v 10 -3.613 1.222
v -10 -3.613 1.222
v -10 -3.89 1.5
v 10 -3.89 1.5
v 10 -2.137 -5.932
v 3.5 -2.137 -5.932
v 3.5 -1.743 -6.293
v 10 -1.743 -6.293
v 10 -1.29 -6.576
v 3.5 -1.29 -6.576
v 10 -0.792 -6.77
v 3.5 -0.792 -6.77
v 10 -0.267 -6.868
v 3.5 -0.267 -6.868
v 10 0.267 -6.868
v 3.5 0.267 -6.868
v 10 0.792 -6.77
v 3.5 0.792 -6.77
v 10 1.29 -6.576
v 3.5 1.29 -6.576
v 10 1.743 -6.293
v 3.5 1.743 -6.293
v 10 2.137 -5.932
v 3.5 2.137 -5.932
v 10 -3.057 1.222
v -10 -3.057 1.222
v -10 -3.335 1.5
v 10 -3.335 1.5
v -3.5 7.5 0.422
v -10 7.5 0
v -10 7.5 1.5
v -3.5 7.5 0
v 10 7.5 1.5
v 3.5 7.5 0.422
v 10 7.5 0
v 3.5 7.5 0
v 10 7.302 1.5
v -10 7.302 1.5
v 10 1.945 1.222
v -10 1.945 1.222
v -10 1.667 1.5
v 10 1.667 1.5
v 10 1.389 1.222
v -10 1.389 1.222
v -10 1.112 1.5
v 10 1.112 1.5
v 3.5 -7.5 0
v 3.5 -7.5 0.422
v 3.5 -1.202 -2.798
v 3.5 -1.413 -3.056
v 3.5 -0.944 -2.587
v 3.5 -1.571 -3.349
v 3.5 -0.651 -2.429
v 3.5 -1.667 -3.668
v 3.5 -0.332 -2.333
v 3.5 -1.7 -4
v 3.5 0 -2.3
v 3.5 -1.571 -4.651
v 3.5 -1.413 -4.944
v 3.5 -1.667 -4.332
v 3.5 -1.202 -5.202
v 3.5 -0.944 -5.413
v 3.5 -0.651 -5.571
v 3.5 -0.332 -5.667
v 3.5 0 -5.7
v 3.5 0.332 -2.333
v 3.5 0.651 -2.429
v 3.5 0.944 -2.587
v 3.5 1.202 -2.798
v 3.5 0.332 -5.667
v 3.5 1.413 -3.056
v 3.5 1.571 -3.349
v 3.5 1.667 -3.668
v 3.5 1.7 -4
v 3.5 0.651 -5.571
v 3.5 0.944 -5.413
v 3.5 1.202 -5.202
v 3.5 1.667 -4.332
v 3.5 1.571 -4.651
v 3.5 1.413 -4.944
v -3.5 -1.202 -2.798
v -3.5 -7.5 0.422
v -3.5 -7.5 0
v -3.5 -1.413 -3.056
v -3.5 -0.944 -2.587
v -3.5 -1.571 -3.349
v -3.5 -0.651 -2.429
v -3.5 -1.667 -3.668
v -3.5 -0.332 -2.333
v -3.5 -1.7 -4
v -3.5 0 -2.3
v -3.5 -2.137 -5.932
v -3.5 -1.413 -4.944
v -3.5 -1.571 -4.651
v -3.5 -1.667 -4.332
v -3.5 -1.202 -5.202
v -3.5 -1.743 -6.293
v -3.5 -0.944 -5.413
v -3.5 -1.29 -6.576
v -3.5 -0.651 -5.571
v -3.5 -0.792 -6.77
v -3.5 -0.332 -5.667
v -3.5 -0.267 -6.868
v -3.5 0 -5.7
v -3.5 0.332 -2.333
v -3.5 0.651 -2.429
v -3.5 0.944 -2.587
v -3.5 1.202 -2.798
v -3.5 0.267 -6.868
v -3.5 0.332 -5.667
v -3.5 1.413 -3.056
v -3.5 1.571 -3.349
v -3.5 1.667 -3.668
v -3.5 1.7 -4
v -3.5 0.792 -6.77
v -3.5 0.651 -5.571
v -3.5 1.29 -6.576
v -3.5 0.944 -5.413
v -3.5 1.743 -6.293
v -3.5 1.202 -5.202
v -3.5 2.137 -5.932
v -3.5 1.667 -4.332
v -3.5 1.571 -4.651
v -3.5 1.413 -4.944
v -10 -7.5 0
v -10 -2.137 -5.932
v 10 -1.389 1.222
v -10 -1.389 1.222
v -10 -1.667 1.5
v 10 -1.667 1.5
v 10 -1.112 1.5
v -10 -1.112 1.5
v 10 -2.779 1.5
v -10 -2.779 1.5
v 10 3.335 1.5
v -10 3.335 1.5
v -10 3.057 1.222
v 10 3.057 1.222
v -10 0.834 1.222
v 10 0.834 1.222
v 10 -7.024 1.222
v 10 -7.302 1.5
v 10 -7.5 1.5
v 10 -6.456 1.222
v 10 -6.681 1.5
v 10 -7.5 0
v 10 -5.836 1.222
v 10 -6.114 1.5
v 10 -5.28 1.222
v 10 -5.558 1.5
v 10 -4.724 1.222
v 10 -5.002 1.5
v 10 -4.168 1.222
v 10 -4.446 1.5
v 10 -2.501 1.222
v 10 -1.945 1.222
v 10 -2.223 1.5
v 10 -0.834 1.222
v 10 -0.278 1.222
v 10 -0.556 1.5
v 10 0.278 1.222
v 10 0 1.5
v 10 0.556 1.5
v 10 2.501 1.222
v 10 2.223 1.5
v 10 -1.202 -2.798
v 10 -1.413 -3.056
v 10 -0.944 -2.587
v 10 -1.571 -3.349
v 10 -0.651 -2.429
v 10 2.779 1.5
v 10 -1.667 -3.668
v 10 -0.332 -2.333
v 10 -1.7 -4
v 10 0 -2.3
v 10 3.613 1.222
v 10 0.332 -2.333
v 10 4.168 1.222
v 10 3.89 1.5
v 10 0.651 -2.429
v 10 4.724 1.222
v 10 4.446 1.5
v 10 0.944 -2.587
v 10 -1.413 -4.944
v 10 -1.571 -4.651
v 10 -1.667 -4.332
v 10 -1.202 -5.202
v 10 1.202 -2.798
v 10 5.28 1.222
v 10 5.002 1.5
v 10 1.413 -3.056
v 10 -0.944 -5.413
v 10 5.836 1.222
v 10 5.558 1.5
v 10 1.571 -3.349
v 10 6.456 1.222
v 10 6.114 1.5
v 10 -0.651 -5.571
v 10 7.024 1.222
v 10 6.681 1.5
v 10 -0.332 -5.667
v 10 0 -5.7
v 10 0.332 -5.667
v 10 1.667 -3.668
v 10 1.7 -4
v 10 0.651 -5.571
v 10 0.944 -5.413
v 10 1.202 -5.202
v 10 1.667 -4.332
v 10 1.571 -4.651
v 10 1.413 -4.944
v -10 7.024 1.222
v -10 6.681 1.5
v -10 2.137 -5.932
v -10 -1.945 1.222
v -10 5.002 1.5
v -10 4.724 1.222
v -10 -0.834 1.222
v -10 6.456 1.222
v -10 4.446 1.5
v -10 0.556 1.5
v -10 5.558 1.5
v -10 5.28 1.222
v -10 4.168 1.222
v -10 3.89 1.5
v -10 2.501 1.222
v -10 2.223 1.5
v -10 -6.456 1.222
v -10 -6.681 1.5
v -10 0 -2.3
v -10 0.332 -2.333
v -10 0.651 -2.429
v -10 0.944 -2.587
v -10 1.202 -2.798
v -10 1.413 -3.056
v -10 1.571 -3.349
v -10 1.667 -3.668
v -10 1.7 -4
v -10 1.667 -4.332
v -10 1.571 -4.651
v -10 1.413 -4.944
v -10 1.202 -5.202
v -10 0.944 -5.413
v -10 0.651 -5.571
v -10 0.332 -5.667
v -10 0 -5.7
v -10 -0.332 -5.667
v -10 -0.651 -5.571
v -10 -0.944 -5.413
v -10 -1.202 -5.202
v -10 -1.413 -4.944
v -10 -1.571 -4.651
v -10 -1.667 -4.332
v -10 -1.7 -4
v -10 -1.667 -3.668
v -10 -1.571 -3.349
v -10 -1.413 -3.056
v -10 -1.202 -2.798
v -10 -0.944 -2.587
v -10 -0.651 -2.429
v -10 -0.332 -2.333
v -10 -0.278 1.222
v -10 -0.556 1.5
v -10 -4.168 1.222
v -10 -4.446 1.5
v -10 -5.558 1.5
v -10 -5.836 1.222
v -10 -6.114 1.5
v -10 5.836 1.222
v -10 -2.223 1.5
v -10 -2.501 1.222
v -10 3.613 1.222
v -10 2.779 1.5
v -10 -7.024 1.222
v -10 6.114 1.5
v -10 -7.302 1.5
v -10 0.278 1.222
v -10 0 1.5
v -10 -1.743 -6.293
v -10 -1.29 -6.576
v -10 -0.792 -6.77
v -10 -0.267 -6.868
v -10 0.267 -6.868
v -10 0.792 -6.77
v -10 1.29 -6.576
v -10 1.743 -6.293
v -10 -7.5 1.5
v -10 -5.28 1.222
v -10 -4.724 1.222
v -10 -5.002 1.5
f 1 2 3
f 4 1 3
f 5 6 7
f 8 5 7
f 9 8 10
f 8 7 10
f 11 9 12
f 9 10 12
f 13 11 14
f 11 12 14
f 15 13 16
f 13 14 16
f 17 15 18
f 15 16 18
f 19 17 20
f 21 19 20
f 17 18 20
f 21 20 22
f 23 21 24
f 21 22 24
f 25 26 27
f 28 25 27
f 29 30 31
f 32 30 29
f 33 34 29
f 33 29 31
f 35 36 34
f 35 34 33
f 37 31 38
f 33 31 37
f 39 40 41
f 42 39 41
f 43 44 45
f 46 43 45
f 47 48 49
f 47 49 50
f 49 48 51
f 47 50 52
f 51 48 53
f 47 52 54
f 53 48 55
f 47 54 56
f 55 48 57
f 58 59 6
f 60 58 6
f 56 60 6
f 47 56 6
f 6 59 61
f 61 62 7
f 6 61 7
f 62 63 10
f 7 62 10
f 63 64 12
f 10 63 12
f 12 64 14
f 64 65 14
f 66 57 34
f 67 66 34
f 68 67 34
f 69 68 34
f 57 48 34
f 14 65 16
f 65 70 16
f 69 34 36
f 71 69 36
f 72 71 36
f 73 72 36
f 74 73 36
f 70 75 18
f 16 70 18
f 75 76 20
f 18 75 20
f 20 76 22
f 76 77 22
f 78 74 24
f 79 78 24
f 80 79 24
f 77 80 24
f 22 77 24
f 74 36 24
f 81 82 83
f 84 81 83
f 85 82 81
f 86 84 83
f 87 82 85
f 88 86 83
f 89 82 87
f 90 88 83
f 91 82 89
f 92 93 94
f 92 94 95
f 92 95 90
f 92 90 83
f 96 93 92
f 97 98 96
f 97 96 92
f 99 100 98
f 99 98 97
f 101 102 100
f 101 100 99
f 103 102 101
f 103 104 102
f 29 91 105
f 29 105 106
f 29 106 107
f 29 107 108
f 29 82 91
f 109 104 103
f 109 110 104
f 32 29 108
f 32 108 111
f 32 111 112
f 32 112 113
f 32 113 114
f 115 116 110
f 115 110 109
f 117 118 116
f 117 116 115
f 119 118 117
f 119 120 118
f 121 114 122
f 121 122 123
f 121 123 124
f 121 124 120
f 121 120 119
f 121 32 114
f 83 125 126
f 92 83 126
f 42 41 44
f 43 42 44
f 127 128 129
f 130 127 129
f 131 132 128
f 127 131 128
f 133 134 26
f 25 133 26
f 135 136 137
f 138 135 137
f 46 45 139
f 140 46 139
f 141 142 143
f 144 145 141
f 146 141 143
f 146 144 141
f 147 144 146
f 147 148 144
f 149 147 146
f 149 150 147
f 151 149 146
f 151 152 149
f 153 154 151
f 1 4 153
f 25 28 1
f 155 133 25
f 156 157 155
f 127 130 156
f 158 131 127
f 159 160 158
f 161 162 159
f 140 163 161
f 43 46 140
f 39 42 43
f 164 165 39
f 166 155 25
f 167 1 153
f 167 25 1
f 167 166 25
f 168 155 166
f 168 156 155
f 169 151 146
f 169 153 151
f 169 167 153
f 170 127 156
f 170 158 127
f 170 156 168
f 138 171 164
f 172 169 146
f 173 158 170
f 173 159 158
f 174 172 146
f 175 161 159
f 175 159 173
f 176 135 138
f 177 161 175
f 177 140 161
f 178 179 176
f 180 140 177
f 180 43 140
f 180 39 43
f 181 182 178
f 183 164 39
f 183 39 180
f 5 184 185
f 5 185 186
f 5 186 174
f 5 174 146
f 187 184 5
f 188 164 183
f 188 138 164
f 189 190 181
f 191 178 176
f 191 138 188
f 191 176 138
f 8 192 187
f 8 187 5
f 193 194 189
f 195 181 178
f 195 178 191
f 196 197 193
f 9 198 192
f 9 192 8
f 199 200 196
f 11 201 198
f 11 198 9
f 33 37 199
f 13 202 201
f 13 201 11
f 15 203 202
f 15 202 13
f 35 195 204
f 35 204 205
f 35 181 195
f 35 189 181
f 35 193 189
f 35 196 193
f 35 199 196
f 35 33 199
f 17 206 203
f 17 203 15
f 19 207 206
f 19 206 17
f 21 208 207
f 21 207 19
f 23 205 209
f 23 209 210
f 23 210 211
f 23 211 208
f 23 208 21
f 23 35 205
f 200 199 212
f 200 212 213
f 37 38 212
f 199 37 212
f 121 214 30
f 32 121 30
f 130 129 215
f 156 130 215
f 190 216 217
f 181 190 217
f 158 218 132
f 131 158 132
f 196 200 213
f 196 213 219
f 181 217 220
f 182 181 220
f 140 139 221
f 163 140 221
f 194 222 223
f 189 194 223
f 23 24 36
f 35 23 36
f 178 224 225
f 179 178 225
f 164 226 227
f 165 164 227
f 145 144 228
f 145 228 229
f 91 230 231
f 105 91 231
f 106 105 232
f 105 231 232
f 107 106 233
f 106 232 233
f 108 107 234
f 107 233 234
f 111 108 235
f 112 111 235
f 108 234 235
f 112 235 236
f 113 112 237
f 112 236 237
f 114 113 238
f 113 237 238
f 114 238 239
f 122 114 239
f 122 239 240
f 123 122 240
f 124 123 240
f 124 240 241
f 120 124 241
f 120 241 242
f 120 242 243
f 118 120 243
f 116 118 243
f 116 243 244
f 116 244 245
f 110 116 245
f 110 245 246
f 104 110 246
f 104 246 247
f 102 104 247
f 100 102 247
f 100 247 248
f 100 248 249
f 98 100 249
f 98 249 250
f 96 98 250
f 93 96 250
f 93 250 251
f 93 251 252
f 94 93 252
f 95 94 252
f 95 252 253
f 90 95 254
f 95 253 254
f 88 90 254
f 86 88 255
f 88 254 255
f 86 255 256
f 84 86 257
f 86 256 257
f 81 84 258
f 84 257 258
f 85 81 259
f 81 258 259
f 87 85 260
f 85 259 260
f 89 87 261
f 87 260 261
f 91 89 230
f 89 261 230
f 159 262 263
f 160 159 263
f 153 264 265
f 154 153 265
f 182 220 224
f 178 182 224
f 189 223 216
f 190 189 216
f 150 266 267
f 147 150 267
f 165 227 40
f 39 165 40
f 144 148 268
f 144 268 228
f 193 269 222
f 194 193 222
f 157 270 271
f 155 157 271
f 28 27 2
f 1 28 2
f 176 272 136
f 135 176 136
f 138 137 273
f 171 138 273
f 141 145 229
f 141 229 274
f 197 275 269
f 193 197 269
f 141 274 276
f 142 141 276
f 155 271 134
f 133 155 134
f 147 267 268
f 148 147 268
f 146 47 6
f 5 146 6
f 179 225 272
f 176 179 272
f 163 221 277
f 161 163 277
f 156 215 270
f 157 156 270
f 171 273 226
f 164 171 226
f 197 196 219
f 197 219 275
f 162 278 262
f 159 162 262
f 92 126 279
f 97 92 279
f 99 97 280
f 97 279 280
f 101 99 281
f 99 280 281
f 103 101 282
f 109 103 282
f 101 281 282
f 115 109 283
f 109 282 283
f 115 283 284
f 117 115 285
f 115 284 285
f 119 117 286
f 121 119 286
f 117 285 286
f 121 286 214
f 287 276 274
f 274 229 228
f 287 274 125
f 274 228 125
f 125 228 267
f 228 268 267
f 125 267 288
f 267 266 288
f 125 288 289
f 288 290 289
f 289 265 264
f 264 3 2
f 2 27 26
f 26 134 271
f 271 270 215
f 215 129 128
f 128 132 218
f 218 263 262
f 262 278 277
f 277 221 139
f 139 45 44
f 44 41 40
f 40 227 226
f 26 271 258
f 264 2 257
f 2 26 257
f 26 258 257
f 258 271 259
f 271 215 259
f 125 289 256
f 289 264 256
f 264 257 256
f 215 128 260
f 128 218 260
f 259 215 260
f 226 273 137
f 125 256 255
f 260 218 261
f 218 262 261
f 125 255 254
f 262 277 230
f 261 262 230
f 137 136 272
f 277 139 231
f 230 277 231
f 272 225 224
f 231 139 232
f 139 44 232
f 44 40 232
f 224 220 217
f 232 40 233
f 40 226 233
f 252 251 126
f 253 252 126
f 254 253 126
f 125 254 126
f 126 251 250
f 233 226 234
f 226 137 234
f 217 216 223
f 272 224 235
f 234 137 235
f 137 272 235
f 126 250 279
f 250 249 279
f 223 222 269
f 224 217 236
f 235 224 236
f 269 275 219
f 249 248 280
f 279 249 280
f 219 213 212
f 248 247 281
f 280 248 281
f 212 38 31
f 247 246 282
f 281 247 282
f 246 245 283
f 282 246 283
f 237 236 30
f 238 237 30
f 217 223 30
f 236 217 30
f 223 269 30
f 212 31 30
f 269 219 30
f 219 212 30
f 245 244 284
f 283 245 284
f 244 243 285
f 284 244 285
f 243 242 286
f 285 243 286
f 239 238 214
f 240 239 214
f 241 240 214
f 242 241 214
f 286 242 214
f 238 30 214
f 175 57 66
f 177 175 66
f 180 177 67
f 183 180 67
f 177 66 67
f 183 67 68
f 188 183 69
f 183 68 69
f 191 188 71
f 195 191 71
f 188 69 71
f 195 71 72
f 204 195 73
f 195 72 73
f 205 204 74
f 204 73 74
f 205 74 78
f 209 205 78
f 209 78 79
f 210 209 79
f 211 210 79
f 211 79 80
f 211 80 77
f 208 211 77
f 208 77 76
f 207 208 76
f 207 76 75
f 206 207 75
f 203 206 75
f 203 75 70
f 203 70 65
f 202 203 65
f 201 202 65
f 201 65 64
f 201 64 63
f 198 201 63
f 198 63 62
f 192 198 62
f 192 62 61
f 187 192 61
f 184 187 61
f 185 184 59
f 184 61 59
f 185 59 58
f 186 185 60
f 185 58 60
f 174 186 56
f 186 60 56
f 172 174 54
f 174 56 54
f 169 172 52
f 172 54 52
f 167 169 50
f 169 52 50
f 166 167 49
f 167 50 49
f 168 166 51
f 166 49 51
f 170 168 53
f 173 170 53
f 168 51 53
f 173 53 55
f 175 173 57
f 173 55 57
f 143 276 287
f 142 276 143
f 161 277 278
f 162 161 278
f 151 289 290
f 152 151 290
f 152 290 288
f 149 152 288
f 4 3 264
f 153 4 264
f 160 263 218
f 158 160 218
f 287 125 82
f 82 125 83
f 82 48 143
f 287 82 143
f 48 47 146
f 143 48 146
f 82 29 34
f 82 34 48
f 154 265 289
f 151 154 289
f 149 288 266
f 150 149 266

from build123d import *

# Parameters (mm, degrees)
ESQUISSE2_W             = 20
ESQUISSE2_H             = 15
BOSS_EXTRU_1_DEPTH      = 1.5
ESQUISSE3_R             = 1.7
BOSS_EXTRU_2_DEPTH      = 20
ENL_V_MAT_EXTRU_2_DEPTH = 3.5
ENL_V_MAT_EXTRU_4_DEPTH = 21


with BuildPart() as part:
    # Esquisse2 → Boss.-Extru.1 (new body)
    with BuildSketch(Plane.XY):
        Rectangle(ESQUISSE2_W, ESQUISSE2_H)
    extrude(amount=BOSS_EXTRU_1_DEPTH)

    # Esquisse3 → Boss.-Extru.2 (add)
    with BuildSketch(Plane.ZY.offset(10)):
        with BuildLine():
            Line((-5.931892952, 2.136705913), (0, 7.5))
            Line((0, 7.5), (0, -7.5))
            Line((0, -7.5), (-5.931892952, -2.136705913))
            ThreePointArc((-5.931892952, -2.136705913), (-6.880576771, 0), (-5.931892952, 2.136705913))
        make_face()
        with Locations((-4, 0)):
            Circle(ESQUISSE3_R, mode=Mode.SUBTRACT)
    extrude(amount=-BOSS_EXTRU_2_DEPTH)

    # Esquisse5 → Enlèv. mat.-Extru.2 (cut, symmetric)
    with BuildSketch(Plane.ZY):
        with BuildLine():
            Line((0.421634759, 7.5), (0.421634759, -7.5))
            Line((0.421634759, -7.5), (0, -7.5))
            Line((0, -7.5), (-5.931892952, -2.136705913))
            ThreePointArc((-5.931892952, -2.136705913), (-6.880576771, 0), (-5.931892952, 2.136705913))
            Line((-5.931892952, 2.136705913), (0, 7.5))
            Line((0, 7.5), (0.421634759, 7.5))
        make_face()
    extrude(amount=ENL_V_MAT_EXTRU_2_DEPTH, both=True, mode=Mode.SUBTRACT)

    # Esquisse4 → Enlèv. mat.-Extru.4 (cut)
    with BuildSketch(Plane.ZY.offset(10)):
        Polygon((1.222110979, 7.02363184), (1.5, 6.681425034), (1.5, 7.301520861), align=None)
        Polygon((1.222110979, 6.455765268), (1.5, 6.113558462), (1.5, 6.681425034), align=None)
        Polygon((1.222110979, 5.835669441), (1.5, 5.55778042), (1.5, 6.113558462), align=None)
        Polygon((1.222110979, 5.279891399), (1.5, 5.002002378), (1.5, 5.55778042), align=None)
        Polygon((1.222110979, 4.724113357), (1.5, 4.446224336), (1.5, 5.002002378), align=None)
        Polygon((1.222110979, 4.168335315), (1.5, 3.890446294), (1.5, 4.446224336), align=None)
        Polygon((1.222110979, 3.612557273), (1.5, 3.334668252), (1.5, 3.890446294), align=None)
        Polygon((1.222110979, 3.056779231), (1.5, 2.77889021), (1.5, 3.334668252), align=None)
        Polygon((1.222110979, 2.501001189), (1.5, 2.223112168), (1.5, 2.77889021), align=None)
        Polygon((1.222110979, 1.945223147), (1.5, 1.667334126), (1.5, 2.223112168), align=None)
        Polygon((1.222110979, 1.389445105), (1.5, 1.111556084), (1.5, 1.667334126), align=None)
        Polygon((1.222110979, 0.833667063), (1.5, 0.555778042), (1.5, 1.111556084), align=None)
        Polygon((1.222110979, 0.277889021), (1.5, 0), (1.5, 0.555778042), align=None)
        Polygon((1.5, -0.555778042), (1.5, 0), (1.222110979, -0.277889021), align=None)
        Polygon((1.5, -1.111556084), (1.5, -0.555778042), (1.222110979, -0.833667063), align=None)
        Polygon((1.5, -1.667334126), (1.5, -1.111556084), (1.222110979, -1.389445105), align=None)
        Polygon((1.5, -2.223112168), (1.5, -1.667334126), (1.222110979, -1.945223147), align=None)
        Polygon((1.5, -2.77889021), (1.5, -2.223112168), (1.222110979, -2.501001189), align=None)
        Polygon((1.5, -3.334668252), (1.5, -2.77889021), (1.222110979, -3.056779231), align=None)
        Polygon((1.5, -3.890446294), (1.5, -3.334668252), (1.222110979, -3.612557273), align=None)
        Polygon((1.5, -4.446224336), (1.5, -3.890446294), (1.222110979, -4.168335315), align=None)
        Polygon((1.5, -5.002002378), (1.5, -4.446224336), (1.222110979, -4.724113357), align=None)
        Polygon((1.5, -5.55778042), (1.5, -5.002002378), (1.222110979, -5.279891399), align=None)
        Polygon((1.5, -6.113558462), (1.5, -5.55778042), (1.222110979, -5.835669441), align=None)
        Polygon((1.5, -6.681425034), (1.5, -6.113558462), (1.222110979, -6.455765268), align=None)
        Polygon((1.5, -7.301520861), (1.5, -6.681425034), (1.222110979, -7.02363184), align=None)
    extrude(amount=-ENL_V_MAT_EXTRU_4_DEPTH, mode=Mode.SUBTRACT)


solid = part.part
